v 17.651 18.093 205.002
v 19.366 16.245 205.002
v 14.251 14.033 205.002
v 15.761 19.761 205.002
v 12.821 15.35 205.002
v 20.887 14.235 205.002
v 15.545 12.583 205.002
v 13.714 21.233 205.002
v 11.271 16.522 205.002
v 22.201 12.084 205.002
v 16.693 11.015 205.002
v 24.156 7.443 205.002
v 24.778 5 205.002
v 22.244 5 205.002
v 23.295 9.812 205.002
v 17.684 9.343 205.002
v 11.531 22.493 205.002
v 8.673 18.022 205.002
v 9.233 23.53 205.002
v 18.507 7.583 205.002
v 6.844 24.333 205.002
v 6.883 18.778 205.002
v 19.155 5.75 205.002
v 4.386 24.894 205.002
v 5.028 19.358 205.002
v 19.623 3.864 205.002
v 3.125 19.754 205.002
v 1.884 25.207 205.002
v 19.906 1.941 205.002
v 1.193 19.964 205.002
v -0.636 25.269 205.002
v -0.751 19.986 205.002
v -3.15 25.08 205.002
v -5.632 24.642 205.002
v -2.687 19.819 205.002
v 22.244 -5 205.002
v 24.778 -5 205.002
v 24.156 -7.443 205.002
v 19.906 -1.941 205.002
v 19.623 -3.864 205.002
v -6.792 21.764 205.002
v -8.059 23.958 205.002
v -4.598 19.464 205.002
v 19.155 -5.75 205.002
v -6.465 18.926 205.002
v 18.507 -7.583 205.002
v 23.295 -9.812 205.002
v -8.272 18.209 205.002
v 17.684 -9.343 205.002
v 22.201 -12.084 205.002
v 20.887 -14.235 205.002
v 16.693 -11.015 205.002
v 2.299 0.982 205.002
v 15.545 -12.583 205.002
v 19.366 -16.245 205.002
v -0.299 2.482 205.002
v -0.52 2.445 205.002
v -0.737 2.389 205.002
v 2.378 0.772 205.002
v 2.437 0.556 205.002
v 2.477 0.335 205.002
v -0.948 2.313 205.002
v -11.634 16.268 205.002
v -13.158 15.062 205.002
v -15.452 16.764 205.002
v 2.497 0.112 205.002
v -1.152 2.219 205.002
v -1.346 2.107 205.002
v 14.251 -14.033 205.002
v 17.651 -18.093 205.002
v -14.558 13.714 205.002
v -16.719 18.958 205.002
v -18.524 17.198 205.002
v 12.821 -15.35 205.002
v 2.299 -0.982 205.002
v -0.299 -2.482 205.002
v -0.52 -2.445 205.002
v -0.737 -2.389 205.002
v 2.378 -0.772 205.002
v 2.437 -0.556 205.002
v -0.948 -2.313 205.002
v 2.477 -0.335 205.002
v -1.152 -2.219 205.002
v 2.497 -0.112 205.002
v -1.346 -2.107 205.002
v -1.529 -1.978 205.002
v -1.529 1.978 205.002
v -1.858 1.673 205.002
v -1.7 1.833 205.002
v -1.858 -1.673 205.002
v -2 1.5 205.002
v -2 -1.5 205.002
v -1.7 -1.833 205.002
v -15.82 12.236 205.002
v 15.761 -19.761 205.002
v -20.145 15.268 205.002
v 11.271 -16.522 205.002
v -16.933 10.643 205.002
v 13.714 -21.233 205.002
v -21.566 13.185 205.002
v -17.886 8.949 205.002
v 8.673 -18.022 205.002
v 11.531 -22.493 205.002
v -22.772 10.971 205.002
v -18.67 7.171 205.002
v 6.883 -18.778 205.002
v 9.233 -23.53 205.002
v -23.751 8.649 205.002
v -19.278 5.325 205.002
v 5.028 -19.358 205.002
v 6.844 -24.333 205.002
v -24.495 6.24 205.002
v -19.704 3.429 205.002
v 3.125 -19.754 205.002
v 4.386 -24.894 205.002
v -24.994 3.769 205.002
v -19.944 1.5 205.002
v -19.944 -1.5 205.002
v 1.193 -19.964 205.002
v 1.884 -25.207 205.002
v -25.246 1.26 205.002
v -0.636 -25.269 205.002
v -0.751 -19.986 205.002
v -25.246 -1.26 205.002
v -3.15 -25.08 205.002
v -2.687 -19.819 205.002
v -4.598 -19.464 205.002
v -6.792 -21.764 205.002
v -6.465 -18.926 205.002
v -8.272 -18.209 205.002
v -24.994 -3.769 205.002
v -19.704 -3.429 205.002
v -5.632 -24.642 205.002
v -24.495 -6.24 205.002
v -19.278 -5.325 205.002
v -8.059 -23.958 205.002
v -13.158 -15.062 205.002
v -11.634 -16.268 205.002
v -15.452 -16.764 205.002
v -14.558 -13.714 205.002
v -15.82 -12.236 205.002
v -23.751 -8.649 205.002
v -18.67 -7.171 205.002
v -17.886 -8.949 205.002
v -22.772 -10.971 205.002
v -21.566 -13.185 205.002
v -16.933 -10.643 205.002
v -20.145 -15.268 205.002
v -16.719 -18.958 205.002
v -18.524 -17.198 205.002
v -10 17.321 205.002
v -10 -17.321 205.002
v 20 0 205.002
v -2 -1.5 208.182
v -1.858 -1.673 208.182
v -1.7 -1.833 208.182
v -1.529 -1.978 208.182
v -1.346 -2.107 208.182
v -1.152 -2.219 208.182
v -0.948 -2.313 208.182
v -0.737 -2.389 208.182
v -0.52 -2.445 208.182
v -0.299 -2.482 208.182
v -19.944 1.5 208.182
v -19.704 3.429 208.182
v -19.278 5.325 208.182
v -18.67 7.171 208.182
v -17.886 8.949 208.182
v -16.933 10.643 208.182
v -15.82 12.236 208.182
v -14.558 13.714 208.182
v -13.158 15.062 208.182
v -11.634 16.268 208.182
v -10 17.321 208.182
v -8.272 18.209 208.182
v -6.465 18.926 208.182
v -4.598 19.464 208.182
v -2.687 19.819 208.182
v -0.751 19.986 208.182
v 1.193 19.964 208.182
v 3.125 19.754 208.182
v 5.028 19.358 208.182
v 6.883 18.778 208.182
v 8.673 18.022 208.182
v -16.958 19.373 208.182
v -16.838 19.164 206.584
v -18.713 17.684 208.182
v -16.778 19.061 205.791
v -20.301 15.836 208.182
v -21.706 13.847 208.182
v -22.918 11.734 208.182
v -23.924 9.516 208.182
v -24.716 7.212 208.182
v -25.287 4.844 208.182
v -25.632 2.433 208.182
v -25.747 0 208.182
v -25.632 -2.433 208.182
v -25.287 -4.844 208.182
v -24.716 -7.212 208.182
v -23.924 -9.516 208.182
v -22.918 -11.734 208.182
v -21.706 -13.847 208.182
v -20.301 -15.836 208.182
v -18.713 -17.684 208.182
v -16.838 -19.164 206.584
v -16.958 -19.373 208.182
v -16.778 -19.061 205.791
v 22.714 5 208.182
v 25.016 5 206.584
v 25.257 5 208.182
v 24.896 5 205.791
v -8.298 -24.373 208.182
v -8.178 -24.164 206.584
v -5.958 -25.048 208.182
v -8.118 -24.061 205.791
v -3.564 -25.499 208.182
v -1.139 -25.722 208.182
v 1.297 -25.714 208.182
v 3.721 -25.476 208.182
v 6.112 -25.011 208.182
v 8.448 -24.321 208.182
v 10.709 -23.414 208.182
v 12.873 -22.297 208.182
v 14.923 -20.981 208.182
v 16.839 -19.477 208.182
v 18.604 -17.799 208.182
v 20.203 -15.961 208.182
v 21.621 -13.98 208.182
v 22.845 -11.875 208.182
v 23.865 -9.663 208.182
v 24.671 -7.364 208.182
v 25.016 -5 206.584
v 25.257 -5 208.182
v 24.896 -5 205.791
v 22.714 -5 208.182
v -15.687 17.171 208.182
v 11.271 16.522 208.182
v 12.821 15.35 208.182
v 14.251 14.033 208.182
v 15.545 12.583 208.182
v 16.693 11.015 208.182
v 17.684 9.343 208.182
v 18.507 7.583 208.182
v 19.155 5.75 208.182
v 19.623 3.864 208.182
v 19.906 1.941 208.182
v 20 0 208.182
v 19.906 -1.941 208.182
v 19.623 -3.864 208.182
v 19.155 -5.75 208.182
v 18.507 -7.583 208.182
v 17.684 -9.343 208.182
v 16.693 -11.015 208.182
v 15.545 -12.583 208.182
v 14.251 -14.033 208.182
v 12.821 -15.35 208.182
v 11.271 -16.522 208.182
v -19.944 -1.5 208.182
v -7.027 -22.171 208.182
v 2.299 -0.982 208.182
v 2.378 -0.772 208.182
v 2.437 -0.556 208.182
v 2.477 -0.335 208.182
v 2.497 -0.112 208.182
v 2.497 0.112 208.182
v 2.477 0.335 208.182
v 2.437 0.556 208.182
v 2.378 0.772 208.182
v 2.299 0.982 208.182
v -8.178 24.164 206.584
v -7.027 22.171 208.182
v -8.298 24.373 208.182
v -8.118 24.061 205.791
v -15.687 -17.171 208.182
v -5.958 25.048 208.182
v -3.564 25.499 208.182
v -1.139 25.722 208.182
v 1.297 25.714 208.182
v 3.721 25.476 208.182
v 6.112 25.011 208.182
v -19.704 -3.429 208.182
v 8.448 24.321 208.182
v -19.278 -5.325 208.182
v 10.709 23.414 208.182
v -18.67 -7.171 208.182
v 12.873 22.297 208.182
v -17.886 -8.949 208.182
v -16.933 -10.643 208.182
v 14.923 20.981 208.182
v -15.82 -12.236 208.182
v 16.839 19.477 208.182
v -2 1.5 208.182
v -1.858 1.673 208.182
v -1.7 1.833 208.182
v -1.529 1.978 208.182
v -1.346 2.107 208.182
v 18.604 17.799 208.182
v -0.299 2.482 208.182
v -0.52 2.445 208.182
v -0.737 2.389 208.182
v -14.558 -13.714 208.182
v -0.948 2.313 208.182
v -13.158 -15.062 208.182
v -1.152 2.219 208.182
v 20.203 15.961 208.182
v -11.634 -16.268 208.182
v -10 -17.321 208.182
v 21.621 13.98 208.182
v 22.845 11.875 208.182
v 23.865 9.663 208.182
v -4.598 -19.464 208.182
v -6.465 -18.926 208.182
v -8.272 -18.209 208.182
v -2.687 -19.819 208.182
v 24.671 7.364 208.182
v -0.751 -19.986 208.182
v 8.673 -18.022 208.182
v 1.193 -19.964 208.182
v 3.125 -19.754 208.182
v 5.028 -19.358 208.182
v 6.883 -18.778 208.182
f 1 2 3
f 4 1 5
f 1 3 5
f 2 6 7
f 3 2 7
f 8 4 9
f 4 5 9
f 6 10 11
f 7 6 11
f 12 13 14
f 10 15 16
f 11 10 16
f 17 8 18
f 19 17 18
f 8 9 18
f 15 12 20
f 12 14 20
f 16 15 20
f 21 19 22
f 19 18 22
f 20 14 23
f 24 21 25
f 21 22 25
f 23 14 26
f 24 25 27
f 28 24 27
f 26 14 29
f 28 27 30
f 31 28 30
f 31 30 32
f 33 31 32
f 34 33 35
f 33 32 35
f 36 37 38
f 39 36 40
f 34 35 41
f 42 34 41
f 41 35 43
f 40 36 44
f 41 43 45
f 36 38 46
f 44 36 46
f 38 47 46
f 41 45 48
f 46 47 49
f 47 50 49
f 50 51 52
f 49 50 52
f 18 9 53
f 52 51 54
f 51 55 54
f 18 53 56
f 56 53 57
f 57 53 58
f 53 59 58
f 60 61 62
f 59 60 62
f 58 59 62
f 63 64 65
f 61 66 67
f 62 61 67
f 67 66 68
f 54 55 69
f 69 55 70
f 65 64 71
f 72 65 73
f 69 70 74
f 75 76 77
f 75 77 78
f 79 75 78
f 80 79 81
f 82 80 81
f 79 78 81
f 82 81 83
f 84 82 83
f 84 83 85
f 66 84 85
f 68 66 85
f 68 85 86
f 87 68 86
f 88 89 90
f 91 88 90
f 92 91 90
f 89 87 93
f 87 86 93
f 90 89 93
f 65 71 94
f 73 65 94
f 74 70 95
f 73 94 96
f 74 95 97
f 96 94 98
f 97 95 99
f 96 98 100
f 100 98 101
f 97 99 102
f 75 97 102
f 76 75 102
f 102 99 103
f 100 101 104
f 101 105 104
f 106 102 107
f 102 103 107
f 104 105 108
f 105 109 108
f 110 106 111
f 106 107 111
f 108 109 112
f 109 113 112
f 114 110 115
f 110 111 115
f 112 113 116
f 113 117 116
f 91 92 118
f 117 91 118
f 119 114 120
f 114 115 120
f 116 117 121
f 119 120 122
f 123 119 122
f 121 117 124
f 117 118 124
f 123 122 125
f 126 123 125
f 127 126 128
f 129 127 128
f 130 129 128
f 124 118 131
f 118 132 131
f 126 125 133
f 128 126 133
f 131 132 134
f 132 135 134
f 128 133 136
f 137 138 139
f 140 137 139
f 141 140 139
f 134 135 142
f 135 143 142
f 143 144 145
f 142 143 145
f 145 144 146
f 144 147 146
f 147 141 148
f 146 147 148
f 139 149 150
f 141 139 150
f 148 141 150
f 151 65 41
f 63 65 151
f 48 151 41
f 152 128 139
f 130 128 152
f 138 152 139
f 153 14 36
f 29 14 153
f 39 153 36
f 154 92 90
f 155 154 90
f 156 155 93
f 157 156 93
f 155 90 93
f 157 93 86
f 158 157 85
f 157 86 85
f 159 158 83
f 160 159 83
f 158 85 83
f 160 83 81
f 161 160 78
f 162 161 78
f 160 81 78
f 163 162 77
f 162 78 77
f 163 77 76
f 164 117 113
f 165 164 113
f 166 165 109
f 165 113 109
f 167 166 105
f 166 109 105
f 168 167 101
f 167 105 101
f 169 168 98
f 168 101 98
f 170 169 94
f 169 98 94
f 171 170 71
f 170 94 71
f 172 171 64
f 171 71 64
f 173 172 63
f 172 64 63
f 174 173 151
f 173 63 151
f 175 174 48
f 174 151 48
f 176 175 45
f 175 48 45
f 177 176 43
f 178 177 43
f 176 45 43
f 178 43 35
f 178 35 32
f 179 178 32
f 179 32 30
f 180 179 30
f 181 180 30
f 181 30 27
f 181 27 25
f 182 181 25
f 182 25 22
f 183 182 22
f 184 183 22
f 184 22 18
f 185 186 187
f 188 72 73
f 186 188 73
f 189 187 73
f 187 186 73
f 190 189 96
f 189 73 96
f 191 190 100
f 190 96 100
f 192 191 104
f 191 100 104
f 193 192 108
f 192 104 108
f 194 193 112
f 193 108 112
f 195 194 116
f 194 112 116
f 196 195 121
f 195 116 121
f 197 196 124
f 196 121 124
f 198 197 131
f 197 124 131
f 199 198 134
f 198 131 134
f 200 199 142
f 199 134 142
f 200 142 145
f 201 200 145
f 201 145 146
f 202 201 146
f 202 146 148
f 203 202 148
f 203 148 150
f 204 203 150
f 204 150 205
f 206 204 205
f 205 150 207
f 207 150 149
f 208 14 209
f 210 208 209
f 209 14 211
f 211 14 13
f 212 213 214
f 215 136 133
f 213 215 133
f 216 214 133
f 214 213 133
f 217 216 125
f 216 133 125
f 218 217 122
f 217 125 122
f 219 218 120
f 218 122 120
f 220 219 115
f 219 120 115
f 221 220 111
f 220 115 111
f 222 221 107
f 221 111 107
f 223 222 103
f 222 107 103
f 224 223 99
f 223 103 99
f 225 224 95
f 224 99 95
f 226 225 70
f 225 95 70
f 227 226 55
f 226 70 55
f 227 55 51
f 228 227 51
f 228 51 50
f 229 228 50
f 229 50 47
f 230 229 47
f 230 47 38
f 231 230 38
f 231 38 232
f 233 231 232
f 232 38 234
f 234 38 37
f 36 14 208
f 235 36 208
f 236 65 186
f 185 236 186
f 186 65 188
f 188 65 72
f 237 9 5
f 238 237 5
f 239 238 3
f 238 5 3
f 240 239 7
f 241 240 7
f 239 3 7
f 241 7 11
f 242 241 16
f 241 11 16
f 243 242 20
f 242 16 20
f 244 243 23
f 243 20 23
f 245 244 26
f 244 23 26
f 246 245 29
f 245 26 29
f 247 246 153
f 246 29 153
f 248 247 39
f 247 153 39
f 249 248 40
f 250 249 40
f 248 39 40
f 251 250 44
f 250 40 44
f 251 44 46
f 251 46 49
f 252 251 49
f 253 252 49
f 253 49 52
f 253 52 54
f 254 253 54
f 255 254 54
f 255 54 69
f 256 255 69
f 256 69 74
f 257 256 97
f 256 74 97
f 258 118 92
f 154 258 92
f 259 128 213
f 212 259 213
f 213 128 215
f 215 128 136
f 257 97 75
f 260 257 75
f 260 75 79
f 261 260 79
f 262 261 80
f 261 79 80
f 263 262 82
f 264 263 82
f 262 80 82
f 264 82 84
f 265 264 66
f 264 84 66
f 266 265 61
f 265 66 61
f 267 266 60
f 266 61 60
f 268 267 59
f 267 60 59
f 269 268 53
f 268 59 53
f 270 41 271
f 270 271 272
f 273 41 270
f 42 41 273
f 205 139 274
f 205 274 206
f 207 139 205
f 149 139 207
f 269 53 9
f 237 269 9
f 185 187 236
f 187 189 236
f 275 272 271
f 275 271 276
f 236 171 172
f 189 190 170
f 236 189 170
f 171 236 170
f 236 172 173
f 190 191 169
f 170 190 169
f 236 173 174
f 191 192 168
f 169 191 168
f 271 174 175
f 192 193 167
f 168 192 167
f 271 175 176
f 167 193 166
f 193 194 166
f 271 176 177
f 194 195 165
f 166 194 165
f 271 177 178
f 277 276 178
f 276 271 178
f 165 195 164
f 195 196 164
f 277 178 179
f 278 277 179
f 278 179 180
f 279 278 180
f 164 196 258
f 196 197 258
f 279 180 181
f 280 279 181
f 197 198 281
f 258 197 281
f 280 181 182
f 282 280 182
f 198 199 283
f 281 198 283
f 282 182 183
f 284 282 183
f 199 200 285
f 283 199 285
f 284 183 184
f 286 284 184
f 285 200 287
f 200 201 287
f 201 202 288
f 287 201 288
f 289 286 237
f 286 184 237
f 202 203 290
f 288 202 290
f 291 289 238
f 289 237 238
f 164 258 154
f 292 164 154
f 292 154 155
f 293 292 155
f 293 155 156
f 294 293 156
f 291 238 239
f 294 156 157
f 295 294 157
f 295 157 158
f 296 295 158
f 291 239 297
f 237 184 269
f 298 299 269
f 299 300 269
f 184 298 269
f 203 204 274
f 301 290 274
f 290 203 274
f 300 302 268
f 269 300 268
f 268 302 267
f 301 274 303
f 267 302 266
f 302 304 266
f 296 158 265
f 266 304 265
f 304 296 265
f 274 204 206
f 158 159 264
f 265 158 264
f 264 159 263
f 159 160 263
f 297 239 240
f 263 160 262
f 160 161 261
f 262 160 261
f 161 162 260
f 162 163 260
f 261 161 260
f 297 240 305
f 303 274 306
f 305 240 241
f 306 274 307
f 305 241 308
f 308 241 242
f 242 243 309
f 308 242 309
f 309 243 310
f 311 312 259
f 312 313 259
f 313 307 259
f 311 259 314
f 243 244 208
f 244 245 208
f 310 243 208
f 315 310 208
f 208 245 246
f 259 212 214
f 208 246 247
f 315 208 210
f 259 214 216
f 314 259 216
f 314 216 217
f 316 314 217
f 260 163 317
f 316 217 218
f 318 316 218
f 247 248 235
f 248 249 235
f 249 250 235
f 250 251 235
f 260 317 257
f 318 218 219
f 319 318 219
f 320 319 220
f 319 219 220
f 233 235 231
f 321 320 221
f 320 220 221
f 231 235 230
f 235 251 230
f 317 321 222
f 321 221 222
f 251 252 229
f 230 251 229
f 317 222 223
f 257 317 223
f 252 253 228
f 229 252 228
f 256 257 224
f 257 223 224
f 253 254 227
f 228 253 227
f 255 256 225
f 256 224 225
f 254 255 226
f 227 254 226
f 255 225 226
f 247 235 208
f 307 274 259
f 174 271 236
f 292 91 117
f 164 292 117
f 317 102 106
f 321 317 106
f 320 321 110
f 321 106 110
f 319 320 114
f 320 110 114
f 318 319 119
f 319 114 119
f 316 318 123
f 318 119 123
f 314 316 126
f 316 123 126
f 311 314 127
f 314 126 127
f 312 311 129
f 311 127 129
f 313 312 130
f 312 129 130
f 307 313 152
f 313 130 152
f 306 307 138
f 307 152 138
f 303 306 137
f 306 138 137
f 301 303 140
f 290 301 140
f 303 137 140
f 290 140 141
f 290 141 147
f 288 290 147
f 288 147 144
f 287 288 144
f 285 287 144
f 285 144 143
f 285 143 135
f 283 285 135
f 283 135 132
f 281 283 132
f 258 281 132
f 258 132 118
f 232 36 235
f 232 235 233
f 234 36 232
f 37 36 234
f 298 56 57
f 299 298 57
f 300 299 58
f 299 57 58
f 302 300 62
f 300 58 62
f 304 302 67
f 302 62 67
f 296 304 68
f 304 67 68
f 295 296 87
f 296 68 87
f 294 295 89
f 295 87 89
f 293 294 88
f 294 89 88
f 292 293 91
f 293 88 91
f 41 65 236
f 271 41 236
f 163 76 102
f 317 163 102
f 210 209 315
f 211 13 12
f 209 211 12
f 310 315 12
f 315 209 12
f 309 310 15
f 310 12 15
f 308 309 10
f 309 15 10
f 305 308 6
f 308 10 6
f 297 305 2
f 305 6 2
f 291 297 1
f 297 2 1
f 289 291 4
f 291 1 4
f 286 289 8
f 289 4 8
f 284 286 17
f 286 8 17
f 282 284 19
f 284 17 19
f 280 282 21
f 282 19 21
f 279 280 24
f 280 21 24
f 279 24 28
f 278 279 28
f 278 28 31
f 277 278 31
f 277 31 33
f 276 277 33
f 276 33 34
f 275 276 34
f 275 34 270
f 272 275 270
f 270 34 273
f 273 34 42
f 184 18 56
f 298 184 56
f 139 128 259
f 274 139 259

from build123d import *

# Parameters (mm, degrees)
CUT_EXTRUDE1_DEPTH = 5
CIRPATTERN1_COUNT  = 3
CUT_EXTRUDE2_DEPTH = 3.180622175


with BuildPart() as part:
    # Sketch1 → Revolve1 (revolve)
    with BuildSketch(Plane(origin=(0, 0, 0), x_dir=(1, 0, 0), z_dir=(0, 1, 0)), mode=Mode.PRIVATE) as revolve1_sk:
        Polygon((0, -208.182219687), (25.746837518, -208.182219687), (25.276959566, -205.001597513), (0, -205.001597513), align=None)
    revolve(revolve1_sk.sketch.rotate(Axis((0, 0, 0), (0, 0, 1)), 180), axis=Axis((0, 0, 0), (0, 0, 1)))

    # Sketch2 → Cut-Extrude1 (cut, symmetric)
    with BuildSketch(Plane(origin=(0, 0, 0), x_dir=(1, 0, 0), z_dir=(0, 1, 0))):
        Polygon((22.094125947, -203.98439075), (22.850570101, -209.104790721), (26.737620159, -209.104790721), (25.746837518, -203.98439075), align=None)
    cut_extrude1 = extrude(amount=CUT_EXTRUDE1_DEPTH, both=True, mode=Mode.SUBTRACT)

    # CirPattern1: Cut-Extrude1 ×3 about axis
    cirpattern1_axis = Axis((0, 0, 0), (0, 0, 1))
    for i in range(1, CIRPATTERN1_COUNT):
        add(cut_extrude1.rotate(cirpattern1_axis, i * 360 / CIRPATTERN1_COUNT), mode=Mode.SUBTRACT)

    # Sketch3 → Cut-Extrude2 (cut)
    with BuildSketch(Plane(origin=(0, 0, 205.001597513), x_dir=(-1, 0, 0), z_dir=(0, 0, -1))):
        with BuildLine():
            Line((-11.270873443, -16.521725449), (-2.299038106, -0.982050808))
            ThreePointArc((-2.299038106, -0.982050808), (-2.5, 0), (-2.299038106, 0.982050808))
            Line((-2.299038106, 0.982050808), (-11.270873443, 16.521725449))
            ThreePointArc((-11.270873443, 16.521725449), (-20, 0), (-11.270873443, -16.521725449))
        make_face()
        with BuildLine():
            ThreePointArc((19.943670675, 1.5), (10, 17.320508076), (-8.672797232, 18.021725449))
            Line((-8.672797232, 18.021725449), (0.299038106, 2.482050808))
            ThreePointArc((0.299038106, 2.482050808), (1.25, 2.165063509), (2, 1.5))
            Line((2, 1.5), (19.943670675, 1.5))
        make_face()
        with BuildLine():
            Line((0.299038106, -2.482050808), (-8.672797232, -18.021725449))
            ThreePointArc((-8.672797232, -18.021725449), (10, -17.320508076), (19.943670675, -1.5))
            Line((19.943670675, -1.5), (2, -1.5))
            ThreePointArc((2, -1.5), (1.25, -2.165063509), (0.299038106, -2.482050808))
        make_face()
    extrude(amount=-CUT_EXTRUDE2_DEPTH, mode=Mode.SUBTRACT)


solid = part.part
